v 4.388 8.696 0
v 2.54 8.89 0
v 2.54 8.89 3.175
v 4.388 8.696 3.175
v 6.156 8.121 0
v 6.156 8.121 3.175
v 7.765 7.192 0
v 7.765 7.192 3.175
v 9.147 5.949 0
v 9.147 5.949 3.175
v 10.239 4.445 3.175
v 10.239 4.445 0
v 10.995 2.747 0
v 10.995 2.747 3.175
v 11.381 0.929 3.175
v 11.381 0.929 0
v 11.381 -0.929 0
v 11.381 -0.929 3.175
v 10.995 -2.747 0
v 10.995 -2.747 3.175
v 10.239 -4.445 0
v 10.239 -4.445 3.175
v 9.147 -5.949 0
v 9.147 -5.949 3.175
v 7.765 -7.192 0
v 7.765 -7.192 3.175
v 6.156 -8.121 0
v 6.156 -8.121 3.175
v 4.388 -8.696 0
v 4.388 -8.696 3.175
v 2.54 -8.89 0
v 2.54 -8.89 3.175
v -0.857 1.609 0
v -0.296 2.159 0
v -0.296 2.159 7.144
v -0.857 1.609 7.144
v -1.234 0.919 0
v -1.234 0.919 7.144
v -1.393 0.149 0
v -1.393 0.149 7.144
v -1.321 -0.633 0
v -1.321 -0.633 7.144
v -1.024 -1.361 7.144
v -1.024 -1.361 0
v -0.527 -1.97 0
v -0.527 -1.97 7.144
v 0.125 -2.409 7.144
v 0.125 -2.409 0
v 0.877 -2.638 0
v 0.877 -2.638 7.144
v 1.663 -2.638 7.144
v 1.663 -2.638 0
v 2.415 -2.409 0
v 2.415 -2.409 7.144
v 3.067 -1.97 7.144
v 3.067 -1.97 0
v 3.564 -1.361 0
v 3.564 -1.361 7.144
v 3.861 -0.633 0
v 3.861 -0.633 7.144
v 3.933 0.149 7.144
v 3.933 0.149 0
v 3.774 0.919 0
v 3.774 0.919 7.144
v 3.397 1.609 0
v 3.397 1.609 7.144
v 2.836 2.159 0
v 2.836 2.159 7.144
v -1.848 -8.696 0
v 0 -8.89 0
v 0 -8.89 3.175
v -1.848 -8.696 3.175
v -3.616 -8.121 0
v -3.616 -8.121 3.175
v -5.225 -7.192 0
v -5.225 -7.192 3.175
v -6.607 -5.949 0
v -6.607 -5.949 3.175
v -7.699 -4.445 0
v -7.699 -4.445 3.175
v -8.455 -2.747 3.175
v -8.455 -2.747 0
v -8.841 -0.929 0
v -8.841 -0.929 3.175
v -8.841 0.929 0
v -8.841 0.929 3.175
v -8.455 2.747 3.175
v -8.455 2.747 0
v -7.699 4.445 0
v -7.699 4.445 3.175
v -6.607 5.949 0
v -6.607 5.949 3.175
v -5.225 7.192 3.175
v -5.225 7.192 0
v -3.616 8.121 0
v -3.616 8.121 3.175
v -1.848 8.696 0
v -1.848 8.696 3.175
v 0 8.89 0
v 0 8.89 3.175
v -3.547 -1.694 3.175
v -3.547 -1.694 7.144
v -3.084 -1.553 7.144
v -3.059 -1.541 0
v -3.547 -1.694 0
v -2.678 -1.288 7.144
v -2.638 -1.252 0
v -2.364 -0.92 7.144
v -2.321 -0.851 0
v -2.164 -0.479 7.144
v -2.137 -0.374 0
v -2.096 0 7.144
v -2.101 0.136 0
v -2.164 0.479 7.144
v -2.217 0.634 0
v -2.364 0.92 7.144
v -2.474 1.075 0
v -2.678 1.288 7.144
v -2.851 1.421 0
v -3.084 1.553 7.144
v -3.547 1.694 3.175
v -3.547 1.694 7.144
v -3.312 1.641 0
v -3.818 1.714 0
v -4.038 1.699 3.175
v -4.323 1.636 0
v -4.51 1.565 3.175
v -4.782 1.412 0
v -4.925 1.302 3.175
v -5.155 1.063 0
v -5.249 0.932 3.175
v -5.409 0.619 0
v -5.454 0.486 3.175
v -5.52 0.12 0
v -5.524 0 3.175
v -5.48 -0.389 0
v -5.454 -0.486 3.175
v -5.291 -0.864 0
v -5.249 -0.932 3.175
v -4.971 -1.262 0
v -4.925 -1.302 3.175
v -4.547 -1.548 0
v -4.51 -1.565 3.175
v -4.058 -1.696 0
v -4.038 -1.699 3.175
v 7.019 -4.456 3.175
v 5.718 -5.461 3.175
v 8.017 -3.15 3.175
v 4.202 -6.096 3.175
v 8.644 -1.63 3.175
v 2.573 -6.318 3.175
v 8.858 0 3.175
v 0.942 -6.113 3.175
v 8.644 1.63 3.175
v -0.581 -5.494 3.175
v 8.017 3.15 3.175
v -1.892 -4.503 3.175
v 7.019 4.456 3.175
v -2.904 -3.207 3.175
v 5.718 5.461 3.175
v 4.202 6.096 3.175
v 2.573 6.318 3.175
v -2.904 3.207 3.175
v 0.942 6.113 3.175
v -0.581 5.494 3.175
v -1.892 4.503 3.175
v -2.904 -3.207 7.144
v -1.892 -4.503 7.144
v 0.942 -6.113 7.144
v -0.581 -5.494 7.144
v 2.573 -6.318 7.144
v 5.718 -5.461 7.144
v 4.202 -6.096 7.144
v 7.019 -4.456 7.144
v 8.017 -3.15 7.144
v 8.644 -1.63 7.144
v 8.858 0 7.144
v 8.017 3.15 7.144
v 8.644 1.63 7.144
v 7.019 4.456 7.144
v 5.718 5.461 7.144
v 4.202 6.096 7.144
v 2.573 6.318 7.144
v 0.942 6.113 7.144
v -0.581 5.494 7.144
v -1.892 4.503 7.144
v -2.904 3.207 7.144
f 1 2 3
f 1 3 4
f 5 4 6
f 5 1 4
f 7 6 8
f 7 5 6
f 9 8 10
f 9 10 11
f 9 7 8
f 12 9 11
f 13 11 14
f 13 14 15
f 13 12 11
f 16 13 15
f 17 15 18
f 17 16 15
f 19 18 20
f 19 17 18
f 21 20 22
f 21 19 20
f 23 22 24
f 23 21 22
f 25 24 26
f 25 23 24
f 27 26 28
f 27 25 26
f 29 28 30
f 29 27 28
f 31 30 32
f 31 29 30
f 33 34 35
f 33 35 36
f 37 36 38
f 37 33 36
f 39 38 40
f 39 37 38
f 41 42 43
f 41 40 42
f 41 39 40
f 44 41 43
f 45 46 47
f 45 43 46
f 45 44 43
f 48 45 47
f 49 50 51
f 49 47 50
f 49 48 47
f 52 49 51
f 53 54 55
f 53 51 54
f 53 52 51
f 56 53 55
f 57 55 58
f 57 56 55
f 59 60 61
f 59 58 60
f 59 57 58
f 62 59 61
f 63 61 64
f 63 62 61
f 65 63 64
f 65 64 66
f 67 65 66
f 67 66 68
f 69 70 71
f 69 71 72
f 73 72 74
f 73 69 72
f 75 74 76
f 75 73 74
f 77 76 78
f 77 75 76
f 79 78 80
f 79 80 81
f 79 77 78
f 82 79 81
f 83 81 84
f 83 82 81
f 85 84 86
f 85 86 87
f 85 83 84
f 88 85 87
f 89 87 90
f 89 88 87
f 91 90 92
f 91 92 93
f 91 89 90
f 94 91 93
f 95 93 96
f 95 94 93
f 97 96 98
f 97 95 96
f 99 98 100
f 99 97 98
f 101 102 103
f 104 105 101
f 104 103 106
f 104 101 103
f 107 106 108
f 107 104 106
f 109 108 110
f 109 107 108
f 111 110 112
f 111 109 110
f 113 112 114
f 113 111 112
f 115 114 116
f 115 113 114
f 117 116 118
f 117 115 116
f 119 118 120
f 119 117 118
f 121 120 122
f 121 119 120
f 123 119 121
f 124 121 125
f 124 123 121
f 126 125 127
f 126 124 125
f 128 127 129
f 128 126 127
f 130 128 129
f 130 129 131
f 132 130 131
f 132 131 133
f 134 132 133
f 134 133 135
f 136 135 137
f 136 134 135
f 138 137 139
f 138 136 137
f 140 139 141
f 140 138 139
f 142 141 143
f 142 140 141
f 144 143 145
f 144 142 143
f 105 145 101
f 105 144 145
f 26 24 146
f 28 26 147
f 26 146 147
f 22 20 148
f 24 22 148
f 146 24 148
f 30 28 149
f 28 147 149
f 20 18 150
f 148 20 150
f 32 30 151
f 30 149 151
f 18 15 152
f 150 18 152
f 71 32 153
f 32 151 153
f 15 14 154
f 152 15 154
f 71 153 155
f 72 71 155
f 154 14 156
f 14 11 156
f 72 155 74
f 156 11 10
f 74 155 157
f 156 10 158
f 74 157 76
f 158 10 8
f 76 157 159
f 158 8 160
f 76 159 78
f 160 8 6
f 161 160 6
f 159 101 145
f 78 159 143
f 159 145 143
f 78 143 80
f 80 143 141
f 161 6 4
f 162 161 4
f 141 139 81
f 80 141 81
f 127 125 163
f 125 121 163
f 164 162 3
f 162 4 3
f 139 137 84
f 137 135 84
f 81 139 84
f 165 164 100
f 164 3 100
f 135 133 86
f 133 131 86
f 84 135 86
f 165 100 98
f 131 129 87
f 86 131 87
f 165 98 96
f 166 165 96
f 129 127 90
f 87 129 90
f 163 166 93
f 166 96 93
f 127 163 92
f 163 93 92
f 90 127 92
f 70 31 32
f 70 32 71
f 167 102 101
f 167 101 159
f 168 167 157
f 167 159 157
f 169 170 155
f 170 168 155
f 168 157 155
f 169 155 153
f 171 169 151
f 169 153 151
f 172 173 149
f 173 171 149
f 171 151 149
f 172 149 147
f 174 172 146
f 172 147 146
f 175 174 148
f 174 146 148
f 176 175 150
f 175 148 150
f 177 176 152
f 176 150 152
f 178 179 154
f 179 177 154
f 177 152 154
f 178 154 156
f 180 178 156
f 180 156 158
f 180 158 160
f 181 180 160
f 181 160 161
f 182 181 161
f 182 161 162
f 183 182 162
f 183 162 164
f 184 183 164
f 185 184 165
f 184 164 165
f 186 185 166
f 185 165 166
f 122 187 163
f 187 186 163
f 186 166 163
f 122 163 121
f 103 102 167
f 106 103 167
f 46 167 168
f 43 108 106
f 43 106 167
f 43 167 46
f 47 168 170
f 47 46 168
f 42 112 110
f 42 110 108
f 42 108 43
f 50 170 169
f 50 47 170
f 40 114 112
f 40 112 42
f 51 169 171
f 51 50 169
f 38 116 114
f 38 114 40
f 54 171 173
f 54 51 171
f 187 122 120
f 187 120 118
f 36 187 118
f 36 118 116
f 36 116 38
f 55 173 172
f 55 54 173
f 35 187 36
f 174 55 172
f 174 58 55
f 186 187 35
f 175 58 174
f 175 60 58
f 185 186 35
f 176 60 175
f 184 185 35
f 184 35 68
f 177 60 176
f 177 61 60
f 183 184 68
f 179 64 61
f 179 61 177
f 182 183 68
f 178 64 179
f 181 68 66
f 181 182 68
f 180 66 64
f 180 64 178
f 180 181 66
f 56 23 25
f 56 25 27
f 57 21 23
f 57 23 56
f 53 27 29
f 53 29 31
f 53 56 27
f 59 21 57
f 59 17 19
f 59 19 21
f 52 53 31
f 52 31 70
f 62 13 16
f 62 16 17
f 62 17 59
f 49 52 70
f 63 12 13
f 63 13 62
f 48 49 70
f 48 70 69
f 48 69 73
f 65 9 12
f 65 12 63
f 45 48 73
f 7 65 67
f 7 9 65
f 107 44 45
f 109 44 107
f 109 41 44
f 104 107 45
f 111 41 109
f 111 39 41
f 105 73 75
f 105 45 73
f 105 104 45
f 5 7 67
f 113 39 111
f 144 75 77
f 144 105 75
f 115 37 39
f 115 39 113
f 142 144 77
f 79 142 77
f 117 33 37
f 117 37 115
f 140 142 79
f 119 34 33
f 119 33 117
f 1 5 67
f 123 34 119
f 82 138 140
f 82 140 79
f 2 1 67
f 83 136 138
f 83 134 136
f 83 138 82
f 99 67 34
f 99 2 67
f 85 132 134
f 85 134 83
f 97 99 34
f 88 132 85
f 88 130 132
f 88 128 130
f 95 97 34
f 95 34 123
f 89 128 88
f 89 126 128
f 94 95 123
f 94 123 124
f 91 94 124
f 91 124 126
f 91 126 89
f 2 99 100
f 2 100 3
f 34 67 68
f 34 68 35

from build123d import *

# Parameters (mm, degrees)
BOSS_EXTRUDE1_DEPTH     = 3.175
SKETCH4_R               = 6.31825
BOSS_EXTRUDE2_DEPTH     = 3.96875
CUT_EXTRUDE1_DEPTH      = 16.014259108
CUT_EXTRUDE1_DEPTH_BACK = 16.014259108
SKETCH2_R               = 0.9
CUT_EXTRUDE2_DEPTH      = 16.014259108
CUT_EXTRUDE2_DEPTH_BACK = 3.81
SKETCH3_R               = 1.7145


with BuildPart() as part:
    # Sketch1 → Boss-Extrude1 (new body)
    with BuildSketch(Plane.XY):
        with BuildLine():
            Line((0, 8.89), (2.54, 8.89))
            ThreePointArc((2.54, 8.89), (11.43, 0), (2.54, -8.89))
            Line((2.54, -8.89), (0, -8.89))
            ThreePointArc((0, -8.89), (-8.89, 0), (0, 8.89))
        make_face()
    extrude(amount=BOSS_EXTRUDE1_DEPTH)

    # Sketch4 → Boss-Extrude2 (add)
    with BuildSketch(Plane.XY.offset(3.175)):
        with Locations((2.54, 0)):
            Circle(SKETCH4_R)
    extrude(amount=BOSS_EXTRUDE2_DEPTH)

    # Sketch2 → Cut-Extrude1 (cut, two sides: drawn at the far end of the back side and taken through both)
    with BuildSketch(Plane.XY.offset(3.175).offset(-CUT_EXTRUDE1_DEPTH_BACK)):
        with Locations((-3.81, 0)):
            Circle(SKETCH2_R)
        with BuildLine():
            Line((2.835761157, 2.159), (-0.295761157, 2.159))
            ThreePointArc((-0.295761157, 2.159), (1.27, -2.667), (2.835761157, 2.159))
        make_face()
    extrude(amount=CUT_EXTRUDE1_DEPTH + CUT_EXTRUDE1_DEPTH_BACK, mode=Mode.SUBTRACT)

    # Sketch3 → Cut-Extrude2 (cut, two sides: drawn at the far end of the back side and taken through both)
    with BuildSketch(Plane.XY.offset(3.175).offset(-CUT_EXTRUDE2_DEPTH_BACK)):
        with Locations(Location((-3.81, 0, 0), (0, 0, 278.828200895))):
            Circle(SKETCH3_R)
    extrude(amount=CUT_EXTRUDE2_DEPTH + CUT_EXTRUDE2_DEPTH_BACK, mode=Mode.SUBTRACT)


solid = part.part
